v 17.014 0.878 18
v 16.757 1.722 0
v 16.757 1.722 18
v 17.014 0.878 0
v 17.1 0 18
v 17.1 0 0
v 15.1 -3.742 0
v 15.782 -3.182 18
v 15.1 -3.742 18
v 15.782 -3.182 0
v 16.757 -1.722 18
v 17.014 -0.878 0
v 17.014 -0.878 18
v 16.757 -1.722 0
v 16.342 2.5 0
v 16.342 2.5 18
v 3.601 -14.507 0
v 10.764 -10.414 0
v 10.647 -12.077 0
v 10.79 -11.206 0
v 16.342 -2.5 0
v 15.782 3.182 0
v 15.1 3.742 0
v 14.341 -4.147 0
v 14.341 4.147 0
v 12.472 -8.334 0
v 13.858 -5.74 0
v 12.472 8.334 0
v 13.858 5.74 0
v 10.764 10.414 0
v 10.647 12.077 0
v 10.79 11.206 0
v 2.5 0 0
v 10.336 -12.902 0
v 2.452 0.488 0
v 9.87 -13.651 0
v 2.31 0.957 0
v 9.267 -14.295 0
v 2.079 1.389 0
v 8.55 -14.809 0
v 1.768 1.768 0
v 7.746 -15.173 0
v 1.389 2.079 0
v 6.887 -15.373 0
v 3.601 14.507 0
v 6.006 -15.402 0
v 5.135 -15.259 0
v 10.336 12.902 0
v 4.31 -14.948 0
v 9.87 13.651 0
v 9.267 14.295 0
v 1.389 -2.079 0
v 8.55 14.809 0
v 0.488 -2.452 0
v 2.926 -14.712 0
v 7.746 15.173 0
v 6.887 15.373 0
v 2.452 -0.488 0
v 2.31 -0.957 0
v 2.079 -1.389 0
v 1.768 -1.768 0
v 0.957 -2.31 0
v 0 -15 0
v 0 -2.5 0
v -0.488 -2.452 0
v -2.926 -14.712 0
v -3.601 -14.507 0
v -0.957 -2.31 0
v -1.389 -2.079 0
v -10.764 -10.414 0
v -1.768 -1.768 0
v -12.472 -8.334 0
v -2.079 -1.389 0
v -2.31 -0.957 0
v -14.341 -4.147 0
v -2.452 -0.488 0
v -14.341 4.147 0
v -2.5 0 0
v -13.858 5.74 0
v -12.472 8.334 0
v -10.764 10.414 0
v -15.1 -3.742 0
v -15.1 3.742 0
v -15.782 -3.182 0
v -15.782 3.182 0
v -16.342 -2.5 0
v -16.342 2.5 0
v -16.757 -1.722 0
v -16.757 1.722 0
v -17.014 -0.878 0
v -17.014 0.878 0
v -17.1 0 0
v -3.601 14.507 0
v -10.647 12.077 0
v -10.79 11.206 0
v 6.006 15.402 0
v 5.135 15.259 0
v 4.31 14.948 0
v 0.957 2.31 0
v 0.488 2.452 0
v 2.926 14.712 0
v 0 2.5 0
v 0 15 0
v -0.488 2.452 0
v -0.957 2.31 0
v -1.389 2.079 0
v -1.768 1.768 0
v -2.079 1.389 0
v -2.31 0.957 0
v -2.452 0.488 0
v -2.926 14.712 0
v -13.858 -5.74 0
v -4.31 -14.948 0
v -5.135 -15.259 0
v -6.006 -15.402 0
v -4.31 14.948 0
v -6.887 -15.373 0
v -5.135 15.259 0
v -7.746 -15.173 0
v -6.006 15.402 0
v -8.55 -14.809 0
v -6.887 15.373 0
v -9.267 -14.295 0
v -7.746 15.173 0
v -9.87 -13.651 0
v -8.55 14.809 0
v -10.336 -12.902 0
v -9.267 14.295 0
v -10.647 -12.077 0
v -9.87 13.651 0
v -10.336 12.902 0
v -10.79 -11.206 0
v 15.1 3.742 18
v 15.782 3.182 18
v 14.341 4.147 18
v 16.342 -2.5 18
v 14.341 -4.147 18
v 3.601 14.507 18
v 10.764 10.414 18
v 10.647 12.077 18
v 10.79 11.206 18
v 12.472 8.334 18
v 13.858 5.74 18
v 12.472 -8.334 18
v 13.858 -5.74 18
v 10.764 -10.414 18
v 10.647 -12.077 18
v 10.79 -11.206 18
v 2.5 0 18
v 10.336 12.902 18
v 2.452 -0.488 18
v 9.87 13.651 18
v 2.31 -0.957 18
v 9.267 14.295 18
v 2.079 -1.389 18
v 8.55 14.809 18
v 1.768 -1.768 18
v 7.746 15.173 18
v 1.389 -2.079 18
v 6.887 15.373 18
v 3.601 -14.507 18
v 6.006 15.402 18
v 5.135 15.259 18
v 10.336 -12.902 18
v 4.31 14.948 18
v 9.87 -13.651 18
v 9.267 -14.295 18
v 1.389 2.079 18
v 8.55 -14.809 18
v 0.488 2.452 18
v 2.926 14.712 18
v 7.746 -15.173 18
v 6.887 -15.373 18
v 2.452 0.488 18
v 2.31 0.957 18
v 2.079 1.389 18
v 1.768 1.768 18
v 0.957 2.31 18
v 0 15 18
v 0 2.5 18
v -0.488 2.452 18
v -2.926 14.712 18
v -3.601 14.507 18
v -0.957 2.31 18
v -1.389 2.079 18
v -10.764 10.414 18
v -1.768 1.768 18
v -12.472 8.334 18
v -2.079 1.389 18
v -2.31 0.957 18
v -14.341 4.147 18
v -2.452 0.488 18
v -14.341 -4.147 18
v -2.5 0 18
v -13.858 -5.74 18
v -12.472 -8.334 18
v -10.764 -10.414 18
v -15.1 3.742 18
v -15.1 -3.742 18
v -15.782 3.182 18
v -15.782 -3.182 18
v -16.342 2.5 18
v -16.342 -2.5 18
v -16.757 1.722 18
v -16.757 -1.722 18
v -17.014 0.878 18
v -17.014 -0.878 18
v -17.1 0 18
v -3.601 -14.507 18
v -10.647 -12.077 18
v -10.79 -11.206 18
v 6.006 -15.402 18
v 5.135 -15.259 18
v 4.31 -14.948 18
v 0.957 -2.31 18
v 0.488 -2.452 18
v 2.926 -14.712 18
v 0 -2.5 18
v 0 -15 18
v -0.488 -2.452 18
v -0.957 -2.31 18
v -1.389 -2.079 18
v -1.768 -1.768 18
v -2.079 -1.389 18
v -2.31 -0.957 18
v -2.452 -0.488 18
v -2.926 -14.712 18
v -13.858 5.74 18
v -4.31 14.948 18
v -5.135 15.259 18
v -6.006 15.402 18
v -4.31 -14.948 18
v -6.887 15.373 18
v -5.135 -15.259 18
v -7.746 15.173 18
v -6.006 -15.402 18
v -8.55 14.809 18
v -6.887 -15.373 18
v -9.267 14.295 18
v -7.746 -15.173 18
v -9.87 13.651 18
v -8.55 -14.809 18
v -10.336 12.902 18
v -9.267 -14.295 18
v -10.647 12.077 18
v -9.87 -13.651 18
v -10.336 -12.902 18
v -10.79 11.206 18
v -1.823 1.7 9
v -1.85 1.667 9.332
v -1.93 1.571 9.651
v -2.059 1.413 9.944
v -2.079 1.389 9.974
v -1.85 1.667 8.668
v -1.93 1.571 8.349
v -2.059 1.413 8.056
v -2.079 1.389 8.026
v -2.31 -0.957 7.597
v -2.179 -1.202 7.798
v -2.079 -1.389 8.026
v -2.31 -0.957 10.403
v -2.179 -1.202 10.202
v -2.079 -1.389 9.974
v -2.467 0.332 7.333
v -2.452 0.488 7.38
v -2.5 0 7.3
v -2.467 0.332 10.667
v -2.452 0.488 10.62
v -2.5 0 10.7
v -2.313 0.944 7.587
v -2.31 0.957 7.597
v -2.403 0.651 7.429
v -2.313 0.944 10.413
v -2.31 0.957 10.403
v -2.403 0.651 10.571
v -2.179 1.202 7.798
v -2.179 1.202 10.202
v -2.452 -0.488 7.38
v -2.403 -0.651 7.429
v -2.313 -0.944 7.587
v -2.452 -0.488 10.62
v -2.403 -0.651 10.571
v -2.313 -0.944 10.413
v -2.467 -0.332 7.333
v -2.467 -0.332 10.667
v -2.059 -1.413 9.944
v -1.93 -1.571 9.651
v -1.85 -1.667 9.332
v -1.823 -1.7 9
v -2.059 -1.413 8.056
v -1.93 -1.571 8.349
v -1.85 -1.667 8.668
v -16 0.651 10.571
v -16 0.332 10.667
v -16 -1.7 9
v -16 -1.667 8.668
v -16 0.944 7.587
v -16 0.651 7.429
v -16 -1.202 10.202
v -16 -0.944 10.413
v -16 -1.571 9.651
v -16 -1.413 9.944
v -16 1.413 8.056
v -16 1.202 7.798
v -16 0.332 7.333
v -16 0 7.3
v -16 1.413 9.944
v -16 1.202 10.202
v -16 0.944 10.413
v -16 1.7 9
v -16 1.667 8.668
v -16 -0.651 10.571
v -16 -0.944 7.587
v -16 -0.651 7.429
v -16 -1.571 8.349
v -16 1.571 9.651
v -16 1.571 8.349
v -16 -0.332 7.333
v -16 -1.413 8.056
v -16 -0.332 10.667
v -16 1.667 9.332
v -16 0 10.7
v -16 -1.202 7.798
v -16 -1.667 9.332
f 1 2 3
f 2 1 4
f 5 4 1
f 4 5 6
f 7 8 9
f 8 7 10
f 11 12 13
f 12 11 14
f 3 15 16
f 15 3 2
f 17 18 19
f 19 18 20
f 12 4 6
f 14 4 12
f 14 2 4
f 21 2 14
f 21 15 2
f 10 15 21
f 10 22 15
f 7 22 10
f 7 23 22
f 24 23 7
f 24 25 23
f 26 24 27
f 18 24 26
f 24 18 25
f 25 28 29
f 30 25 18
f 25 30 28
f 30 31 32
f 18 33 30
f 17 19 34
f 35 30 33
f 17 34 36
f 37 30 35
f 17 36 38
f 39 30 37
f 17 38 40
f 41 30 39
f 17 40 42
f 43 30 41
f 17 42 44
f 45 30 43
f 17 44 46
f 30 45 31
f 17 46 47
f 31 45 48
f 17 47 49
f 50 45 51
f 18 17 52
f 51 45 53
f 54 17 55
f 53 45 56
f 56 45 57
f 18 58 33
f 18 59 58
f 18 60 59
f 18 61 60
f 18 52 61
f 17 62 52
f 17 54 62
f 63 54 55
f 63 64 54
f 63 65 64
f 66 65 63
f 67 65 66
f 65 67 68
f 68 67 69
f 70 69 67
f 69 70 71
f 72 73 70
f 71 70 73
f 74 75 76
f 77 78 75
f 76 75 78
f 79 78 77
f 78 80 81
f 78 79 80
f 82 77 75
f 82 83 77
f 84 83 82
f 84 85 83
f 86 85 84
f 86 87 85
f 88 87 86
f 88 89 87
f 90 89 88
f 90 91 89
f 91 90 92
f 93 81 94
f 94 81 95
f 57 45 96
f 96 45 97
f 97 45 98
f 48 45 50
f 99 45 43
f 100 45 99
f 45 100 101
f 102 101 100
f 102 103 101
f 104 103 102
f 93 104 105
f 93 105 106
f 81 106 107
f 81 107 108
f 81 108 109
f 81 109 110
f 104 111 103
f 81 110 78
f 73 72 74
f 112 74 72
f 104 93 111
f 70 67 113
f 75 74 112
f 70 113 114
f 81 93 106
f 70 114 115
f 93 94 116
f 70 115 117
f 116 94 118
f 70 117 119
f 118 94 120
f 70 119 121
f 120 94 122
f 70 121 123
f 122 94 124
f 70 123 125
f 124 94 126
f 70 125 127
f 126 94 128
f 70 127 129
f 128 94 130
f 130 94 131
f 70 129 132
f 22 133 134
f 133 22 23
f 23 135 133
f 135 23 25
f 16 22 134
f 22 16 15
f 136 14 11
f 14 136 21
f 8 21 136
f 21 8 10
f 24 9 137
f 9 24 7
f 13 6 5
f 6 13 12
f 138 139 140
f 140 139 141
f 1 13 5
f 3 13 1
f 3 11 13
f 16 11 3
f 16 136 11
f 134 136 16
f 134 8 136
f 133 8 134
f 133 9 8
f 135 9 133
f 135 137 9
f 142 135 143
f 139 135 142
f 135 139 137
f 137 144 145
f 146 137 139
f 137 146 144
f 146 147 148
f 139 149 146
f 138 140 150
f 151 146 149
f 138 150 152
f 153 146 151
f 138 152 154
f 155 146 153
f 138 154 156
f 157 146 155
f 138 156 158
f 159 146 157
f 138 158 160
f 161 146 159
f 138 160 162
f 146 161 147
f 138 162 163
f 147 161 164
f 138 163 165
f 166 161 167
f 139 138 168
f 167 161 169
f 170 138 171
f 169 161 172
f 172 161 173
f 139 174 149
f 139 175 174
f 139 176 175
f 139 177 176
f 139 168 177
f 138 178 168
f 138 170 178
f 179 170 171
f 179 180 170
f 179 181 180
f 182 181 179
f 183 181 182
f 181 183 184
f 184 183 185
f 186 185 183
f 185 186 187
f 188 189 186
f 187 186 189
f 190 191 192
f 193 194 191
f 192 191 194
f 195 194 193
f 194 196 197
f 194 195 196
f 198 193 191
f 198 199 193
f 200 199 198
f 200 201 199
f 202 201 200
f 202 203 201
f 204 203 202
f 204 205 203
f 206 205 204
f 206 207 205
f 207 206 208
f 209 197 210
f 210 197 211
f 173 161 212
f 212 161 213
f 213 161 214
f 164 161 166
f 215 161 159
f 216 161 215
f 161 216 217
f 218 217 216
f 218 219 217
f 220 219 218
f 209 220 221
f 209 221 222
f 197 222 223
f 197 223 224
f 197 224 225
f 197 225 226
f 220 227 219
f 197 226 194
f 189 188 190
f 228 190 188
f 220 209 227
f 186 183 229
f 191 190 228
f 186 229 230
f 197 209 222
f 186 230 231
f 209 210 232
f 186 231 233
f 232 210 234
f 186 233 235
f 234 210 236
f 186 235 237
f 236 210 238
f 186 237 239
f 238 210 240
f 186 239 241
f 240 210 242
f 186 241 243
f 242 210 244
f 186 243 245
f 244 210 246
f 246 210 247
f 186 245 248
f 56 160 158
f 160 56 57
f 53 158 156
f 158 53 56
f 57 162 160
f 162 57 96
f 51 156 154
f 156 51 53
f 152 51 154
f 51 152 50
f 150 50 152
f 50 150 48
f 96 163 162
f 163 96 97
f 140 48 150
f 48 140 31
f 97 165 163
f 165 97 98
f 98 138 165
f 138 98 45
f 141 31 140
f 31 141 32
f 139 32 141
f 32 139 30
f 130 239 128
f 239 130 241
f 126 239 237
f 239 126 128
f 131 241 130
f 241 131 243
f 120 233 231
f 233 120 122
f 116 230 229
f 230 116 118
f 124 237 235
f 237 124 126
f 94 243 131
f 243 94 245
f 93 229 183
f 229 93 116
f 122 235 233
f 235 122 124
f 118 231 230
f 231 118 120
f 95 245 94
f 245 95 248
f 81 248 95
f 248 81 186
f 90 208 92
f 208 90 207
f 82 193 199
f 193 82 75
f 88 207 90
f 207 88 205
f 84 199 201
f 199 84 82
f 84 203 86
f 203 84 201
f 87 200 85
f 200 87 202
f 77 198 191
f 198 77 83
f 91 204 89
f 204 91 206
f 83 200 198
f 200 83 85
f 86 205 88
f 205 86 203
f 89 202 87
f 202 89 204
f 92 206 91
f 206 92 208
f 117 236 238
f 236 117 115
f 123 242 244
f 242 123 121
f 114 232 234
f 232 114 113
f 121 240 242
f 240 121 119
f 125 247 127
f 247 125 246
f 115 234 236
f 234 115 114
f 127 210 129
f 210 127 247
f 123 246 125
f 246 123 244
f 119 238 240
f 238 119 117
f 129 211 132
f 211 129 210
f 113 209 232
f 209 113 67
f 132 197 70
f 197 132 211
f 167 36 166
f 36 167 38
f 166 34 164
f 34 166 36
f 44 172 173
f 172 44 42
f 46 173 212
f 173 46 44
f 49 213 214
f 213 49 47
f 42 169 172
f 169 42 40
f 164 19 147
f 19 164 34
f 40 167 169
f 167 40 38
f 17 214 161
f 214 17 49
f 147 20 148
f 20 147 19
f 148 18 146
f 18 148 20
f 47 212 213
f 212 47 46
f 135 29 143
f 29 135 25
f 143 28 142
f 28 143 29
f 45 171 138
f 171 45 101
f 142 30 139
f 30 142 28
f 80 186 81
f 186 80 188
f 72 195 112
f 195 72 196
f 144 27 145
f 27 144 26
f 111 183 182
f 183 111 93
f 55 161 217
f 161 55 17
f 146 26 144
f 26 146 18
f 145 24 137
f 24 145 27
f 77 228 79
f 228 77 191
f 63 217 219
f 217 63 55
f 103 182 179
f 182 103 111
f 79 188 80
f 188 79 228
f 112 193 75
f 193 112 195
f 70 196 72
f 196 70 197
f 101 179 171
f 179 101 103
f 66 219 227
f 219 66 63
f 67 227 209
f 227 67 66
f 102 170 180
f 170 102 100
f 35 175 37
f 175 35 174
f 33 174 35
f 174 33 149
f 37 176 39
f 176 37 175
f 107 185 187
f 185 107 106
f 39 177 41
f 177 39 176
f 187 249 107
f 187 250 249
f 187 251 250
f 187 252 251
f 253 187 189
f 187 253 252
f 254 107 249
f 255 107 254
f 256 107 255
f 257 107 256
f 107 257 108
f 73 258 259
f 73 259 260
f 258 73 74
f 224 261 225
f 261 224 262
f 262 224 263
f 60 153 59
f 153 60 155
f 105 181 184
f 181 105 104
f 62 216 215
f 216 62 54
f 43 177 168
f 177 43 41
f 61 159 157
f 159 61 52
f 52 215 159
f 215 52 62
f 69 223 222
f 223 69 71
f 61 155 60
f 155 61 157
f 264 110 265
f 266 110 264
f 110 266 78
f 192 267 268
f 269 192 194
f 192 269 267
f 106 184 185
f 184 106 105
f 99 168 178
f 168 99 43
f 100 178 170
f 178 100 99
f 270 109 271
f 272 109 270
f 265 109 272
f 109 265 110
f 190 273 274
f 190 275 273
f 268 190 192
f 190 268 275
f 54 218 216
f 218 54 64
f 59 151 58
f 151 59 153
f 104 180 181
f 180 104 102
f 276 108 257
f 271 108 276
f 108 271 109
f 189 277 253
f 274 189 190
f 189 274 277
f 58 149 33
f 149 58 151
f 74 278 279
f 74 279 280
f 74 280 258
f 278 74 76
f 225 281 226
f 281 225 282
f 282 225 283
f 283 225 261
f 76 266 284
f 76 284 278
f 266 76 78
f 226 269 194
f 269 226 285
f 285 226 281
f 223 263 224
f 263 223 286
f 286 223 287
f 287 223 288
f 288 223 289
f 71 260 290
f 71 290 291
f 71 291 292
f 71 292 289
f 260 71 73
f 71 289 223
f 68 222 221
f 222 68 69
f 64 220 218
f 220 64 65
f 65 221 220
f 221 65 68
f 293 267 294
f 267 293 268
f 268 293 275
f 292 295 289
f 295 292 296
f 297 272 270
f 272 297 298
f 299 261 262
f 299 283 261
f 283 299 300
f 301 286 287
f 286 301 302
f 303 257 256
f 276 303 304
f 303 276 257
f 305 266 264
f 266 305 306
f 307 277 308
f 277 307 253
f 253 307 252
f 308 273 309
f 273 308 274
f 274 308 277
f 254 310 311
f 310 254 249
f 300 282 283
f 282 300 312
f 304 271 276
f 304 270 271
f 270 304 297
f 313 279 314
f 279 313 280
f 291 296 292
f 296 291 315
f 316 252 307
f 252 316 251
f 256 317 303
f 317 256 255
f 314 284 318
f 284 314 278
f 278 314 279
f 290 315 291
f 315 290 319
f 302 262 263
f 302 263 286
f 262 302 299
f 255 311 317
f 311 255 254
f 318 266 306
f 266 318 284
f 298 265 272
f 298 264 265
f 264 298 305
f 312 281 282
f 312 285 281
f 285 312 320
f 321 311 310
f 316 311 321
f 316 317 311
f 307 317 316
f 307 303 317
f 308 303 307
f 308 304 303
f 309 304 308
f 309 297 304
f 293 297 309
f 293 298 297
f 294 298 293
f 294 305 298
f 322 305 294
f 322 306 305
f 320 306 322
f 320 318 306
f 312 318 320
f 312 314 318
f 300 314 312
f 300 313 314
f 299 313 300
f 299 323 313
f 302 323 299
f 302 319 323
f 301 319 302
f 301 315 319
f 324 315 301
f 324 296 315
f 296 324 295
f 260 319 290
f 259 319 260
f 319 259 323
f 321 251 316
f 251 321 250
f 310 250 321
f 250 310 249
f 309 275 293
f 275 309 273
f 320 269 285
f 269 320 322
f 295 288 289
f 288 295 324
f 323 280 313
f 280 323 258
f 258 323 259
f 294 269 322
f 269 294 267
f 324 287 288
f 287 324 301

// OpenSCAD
$fn = 32;

// ----------------------------------------------------------------------
// Hand knob: 30 x 30 x 18 mm
// ----------------------------------------------------------------------

// --- parameters (mm) ---
grip_d = 30;              // knob diameter
grip_h = 18;              // knob height
shaft_d = 5;              // shaft bore
set_d = 3.4;              // set screw tap hole
knurl_dia = 0.69;         // knurl groove diameter
lobes = 6;                // grip lobes

module body() {
  cylinder(h = grip_h, d = grip_d);
  for (i = [0 : lobes - 1])
    rotate([0, 0, i * 360 / lobes])
      translate([grip_d * 0.42, 0, 0])
        cylinder(h = grip_h, d = grip_d * 0.3);
}

difference() {
  union() {
    body();
  }
  translate([0, 0, -1]) cylinder(h = grip_h + 0 + 2, d = shaft_d);
  translate([-grip_d / 2 - 1, 0, grip_h * 0.5]) rotate([0, 90, 0]) cylinder(h = grip_d / 2 + 2, d = set_d);
}
